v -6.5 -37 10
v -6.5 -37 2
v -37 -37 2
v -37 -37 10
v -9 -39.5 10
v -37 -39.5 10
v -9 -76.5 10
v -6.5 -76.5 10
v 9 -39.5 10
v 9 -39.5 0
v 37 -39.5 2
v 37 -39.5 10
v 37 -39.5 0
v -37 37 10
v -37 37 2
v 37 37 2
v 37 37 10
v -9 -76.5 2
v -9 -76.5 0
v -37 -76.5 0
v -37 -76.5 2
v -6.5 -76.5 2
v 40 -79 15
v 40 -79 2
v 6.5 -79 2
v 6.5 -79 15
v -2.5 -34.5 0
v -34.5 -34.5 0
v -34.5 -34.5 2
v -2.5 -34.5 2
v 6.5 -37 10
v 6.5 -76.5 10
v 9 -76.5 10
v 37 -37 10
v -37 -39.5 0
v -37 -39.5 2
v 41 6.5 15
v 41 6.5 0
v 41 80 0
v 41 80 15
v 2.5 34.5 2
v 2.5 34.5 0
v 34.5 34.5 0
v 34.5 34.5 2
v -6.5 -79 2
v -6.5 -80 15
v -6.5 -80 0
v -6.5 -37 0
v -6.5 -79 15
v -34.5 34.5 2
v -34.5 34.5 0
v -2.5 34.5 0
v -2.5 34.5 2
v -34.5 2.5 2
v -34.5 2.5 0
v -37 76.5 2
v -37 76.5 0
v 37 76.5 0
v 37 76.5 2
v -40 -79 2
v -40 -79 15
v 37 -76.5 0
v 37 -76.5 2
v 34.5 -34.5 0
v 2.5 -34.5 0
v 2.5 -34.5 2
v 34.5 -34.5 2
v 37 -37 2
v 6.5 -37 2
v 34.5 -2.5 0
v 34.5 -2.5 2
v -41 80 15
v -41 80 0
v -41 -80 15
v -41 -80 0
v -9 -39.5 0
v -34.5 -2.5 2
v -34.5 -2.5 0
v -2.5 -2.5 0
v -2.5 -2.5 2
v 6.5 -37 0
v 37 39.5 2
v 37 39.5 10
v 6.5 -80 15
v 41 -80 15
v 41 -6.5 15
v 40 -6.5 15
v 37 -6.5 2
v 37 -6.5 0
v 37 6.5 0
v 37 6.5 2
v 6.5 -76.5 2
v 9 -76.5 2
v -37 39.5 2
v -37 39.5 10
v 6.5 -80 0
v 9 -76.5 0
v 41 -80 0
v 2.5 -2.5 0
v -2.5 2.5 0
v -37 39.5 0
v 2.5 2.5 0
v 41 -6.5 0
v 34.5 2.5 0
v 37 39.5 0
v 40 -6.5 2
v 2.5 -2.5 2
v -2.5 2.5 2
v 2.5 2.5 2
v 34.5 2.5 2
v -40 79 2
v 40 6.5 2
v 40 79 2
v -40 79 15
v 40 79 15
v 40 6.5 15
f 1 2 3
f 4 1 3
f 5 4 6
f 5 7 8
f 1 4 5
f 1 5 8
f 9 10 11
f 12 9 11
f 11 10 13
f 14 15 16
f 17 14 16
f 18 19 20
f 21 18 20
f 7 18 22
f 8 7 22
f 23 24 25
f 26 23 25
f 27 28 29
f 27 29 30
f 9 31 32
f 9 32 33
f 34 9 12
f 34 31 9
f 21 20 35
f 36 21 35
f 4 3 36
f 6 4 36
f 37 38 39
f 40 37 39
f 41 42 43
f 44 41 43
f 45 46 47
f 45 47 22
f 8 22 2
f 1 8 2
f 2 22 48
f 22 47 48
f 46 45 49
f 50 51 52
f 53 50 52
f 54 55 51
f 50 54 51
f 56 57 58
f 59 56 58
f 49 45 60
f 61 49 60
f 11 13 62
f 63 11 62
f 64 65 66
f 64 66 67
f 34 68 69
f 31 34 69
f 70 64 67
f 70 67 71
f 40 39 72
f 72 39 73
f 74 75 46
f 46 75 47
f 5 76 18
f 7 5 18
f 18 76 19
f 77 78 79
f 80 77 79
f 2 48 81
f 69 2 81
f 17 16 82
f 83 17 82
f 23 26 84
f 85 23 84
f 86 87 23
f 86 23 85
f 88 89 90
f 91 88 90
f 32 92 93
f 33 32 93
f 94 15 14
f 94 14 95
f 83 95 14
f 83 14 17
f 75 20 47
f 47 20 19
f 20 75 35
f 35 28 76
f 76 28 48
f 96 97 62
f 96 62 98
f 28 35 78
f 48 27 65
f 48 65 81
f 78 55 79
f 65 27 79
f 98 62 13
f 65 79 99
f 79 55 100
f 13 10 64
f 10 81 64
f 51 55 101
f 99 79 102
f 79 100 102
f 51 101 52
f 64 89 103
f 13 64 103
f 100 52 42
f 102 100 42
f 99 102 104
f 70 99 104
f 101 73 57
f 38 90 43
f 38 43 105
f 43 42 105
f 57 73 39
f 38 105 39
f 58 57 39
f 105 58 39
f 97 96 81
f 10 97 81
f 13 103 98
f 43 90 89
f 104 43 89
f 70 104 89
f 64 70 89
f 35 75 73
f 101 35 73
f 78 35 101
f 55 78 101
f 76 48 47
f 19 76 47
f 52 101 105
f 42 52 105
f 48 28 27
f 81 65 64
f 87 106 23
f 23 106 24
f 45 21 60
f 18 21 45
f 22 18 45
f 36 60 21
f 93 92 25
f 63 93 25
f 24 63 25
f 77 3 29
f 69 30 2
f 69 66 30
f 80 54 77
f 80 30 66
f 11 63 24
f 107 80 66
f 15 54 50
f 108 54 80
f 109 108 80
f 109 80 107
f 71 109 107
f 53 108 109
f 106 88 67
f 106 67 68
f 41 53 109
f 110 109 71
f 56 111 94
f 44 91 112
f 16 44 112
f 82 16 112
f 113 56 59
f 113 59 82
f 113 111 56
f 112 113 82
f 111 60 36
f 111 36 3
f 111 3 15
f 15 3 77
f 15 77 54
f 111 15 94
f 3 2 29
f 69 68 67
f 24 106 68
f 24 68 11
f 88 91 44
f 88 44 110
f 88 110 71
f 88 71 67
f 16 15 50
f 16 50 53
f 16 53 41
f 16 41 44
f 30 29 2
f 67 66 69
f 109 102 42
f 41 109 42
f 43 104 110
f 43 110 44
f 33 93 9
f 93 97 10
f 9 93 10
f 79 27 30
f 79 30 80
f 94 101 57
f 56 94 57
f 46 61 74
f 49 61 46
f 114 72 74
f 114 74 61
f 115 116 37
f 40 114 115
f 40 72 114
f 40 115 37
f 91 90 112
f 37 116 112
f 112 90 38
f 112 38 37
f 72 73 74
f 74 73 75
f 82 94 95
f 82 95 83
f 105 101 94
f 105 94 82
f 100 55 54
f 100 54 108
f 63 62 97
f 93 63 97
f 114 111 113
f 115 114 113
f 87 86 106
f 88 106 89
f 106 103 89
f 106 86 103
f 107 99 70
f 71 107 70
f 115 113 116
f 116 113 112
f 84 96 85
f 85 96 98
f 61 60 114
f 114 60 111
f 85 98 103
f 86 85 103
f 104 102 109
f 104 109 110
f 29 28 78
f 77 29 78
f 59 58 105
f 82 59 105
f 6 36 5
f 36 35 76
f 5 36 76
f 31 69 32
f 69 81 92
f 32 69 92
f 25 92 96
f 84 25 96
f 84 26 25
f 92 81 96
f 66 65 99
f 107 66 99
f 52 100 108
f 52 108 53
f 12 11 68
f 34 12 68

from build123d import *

# Parameters (mm, degrees)
F0_W     = 32
F0_H     = 32
F1_DEPTH = 2
F2_DEPTH = 15
F3_DEPTH = 2
F0_W_2   = 74
F0_H_2   = 2.5
F4_DEPTH = 10


with BuildPart() as f1:
    # F0 (on Top) → F1 (new body)
    with BuildSketch(Plane.XY):
        Polygon((6.5, -37), (37, -37), (37, -6.5), (37, 6.5), (37, 37), (-37, 37), (-37, -37), (-6.5, -37), align=None)
        with Locations((-18.5, -18.5)):
            Rectangle(F0_W, F0_H, mode=Mode.SUBTRACT)
        with Locations((18.5, -18.5)):
            Rectangle(F0_W, F0_H, mode=Mode.SUBTRACT)
        with Locations((-18.5, 18.5)):
            Rectangle(F0_W, F0_H, mode=Mode.SUBTRACT)
        with Locations((18.5, 18.5)):
            Rectangle(F0_W, F0_H, mode=Mode.SUBTRACT)
    extrude(amount=F1_DEPTH)



with BuildPart() as f2:
    # F0 (on Top) → F2 (new body)
    with BuildSketch(Plane.XY):
        Polygon((40, 79), (40, 6.5), (41, 6.5), (41, 80), (-41, 80), (-41, -80), (-6.5, -80), (-6.5, -79), (-40, -79), (-40, 79), align=None)
    extrude(amount=F2_DEPTH)


with BuildPart() as f2b:
    # F0 (on Top) → F2, piece 2 (new body)
    with BuildSketch(Plane.XY):
        Polygon((41, -6.5), (40, -6.5), (40, -79), (6.5, -79), (6.5, -80), (41, -80), align=None)
    extrude(amount=F2_DEPTH)


with BuildPart() as f1_1:
    add(f1.part)

    add(f2.part)  # F3 merges F2

    add(f2b.part)  # F3 merges F2b
    # F0 (on Top) → F3 (join)
    with BuildSketch(Plane.XY):
        Polygon((37, 37), (37, 6.5), (40, 6.5), (40, 79), (-40, 79), (-40, -79), (-6.5, -79), (-6.5, -76.5), (-9, -76.5), (-37, -76.5), (-37, -39.5), (-37, -37), (-37, 37), (-37, 39.5), (-37, 76.5), (37, 76.5), (37, 39.5), align=None)
        Polygon((37, -6.5), (37, -37), (37, -39.5), (37, -76.5), (9, -76.5), (6.5, -76.5), (6.5, -79), (40, -79), (40, -6.5), align=None)
    extrude(amount=F3_DEPTH)

    # F0 (on Top) → F4 (join)
    with BuildSketch(Plane.XY):
        Polygon((-6.5, -76.5), (-6.5, -37), (-37, -37), (-37, -39.5), (-9, -39.5), (-9, -76.5), align=None)
        Polygon((37, -39.5), (37, -37), (6.5, -37), (6.5, -76.5), (9, -76.5), (9, -39.5), align=None)
        with Locations((0, 38.25)):
            Rectangle(F0_W_2, F0_H_2)
    extrude(amount=F4_DEPTH)


solid = f1_1.part
